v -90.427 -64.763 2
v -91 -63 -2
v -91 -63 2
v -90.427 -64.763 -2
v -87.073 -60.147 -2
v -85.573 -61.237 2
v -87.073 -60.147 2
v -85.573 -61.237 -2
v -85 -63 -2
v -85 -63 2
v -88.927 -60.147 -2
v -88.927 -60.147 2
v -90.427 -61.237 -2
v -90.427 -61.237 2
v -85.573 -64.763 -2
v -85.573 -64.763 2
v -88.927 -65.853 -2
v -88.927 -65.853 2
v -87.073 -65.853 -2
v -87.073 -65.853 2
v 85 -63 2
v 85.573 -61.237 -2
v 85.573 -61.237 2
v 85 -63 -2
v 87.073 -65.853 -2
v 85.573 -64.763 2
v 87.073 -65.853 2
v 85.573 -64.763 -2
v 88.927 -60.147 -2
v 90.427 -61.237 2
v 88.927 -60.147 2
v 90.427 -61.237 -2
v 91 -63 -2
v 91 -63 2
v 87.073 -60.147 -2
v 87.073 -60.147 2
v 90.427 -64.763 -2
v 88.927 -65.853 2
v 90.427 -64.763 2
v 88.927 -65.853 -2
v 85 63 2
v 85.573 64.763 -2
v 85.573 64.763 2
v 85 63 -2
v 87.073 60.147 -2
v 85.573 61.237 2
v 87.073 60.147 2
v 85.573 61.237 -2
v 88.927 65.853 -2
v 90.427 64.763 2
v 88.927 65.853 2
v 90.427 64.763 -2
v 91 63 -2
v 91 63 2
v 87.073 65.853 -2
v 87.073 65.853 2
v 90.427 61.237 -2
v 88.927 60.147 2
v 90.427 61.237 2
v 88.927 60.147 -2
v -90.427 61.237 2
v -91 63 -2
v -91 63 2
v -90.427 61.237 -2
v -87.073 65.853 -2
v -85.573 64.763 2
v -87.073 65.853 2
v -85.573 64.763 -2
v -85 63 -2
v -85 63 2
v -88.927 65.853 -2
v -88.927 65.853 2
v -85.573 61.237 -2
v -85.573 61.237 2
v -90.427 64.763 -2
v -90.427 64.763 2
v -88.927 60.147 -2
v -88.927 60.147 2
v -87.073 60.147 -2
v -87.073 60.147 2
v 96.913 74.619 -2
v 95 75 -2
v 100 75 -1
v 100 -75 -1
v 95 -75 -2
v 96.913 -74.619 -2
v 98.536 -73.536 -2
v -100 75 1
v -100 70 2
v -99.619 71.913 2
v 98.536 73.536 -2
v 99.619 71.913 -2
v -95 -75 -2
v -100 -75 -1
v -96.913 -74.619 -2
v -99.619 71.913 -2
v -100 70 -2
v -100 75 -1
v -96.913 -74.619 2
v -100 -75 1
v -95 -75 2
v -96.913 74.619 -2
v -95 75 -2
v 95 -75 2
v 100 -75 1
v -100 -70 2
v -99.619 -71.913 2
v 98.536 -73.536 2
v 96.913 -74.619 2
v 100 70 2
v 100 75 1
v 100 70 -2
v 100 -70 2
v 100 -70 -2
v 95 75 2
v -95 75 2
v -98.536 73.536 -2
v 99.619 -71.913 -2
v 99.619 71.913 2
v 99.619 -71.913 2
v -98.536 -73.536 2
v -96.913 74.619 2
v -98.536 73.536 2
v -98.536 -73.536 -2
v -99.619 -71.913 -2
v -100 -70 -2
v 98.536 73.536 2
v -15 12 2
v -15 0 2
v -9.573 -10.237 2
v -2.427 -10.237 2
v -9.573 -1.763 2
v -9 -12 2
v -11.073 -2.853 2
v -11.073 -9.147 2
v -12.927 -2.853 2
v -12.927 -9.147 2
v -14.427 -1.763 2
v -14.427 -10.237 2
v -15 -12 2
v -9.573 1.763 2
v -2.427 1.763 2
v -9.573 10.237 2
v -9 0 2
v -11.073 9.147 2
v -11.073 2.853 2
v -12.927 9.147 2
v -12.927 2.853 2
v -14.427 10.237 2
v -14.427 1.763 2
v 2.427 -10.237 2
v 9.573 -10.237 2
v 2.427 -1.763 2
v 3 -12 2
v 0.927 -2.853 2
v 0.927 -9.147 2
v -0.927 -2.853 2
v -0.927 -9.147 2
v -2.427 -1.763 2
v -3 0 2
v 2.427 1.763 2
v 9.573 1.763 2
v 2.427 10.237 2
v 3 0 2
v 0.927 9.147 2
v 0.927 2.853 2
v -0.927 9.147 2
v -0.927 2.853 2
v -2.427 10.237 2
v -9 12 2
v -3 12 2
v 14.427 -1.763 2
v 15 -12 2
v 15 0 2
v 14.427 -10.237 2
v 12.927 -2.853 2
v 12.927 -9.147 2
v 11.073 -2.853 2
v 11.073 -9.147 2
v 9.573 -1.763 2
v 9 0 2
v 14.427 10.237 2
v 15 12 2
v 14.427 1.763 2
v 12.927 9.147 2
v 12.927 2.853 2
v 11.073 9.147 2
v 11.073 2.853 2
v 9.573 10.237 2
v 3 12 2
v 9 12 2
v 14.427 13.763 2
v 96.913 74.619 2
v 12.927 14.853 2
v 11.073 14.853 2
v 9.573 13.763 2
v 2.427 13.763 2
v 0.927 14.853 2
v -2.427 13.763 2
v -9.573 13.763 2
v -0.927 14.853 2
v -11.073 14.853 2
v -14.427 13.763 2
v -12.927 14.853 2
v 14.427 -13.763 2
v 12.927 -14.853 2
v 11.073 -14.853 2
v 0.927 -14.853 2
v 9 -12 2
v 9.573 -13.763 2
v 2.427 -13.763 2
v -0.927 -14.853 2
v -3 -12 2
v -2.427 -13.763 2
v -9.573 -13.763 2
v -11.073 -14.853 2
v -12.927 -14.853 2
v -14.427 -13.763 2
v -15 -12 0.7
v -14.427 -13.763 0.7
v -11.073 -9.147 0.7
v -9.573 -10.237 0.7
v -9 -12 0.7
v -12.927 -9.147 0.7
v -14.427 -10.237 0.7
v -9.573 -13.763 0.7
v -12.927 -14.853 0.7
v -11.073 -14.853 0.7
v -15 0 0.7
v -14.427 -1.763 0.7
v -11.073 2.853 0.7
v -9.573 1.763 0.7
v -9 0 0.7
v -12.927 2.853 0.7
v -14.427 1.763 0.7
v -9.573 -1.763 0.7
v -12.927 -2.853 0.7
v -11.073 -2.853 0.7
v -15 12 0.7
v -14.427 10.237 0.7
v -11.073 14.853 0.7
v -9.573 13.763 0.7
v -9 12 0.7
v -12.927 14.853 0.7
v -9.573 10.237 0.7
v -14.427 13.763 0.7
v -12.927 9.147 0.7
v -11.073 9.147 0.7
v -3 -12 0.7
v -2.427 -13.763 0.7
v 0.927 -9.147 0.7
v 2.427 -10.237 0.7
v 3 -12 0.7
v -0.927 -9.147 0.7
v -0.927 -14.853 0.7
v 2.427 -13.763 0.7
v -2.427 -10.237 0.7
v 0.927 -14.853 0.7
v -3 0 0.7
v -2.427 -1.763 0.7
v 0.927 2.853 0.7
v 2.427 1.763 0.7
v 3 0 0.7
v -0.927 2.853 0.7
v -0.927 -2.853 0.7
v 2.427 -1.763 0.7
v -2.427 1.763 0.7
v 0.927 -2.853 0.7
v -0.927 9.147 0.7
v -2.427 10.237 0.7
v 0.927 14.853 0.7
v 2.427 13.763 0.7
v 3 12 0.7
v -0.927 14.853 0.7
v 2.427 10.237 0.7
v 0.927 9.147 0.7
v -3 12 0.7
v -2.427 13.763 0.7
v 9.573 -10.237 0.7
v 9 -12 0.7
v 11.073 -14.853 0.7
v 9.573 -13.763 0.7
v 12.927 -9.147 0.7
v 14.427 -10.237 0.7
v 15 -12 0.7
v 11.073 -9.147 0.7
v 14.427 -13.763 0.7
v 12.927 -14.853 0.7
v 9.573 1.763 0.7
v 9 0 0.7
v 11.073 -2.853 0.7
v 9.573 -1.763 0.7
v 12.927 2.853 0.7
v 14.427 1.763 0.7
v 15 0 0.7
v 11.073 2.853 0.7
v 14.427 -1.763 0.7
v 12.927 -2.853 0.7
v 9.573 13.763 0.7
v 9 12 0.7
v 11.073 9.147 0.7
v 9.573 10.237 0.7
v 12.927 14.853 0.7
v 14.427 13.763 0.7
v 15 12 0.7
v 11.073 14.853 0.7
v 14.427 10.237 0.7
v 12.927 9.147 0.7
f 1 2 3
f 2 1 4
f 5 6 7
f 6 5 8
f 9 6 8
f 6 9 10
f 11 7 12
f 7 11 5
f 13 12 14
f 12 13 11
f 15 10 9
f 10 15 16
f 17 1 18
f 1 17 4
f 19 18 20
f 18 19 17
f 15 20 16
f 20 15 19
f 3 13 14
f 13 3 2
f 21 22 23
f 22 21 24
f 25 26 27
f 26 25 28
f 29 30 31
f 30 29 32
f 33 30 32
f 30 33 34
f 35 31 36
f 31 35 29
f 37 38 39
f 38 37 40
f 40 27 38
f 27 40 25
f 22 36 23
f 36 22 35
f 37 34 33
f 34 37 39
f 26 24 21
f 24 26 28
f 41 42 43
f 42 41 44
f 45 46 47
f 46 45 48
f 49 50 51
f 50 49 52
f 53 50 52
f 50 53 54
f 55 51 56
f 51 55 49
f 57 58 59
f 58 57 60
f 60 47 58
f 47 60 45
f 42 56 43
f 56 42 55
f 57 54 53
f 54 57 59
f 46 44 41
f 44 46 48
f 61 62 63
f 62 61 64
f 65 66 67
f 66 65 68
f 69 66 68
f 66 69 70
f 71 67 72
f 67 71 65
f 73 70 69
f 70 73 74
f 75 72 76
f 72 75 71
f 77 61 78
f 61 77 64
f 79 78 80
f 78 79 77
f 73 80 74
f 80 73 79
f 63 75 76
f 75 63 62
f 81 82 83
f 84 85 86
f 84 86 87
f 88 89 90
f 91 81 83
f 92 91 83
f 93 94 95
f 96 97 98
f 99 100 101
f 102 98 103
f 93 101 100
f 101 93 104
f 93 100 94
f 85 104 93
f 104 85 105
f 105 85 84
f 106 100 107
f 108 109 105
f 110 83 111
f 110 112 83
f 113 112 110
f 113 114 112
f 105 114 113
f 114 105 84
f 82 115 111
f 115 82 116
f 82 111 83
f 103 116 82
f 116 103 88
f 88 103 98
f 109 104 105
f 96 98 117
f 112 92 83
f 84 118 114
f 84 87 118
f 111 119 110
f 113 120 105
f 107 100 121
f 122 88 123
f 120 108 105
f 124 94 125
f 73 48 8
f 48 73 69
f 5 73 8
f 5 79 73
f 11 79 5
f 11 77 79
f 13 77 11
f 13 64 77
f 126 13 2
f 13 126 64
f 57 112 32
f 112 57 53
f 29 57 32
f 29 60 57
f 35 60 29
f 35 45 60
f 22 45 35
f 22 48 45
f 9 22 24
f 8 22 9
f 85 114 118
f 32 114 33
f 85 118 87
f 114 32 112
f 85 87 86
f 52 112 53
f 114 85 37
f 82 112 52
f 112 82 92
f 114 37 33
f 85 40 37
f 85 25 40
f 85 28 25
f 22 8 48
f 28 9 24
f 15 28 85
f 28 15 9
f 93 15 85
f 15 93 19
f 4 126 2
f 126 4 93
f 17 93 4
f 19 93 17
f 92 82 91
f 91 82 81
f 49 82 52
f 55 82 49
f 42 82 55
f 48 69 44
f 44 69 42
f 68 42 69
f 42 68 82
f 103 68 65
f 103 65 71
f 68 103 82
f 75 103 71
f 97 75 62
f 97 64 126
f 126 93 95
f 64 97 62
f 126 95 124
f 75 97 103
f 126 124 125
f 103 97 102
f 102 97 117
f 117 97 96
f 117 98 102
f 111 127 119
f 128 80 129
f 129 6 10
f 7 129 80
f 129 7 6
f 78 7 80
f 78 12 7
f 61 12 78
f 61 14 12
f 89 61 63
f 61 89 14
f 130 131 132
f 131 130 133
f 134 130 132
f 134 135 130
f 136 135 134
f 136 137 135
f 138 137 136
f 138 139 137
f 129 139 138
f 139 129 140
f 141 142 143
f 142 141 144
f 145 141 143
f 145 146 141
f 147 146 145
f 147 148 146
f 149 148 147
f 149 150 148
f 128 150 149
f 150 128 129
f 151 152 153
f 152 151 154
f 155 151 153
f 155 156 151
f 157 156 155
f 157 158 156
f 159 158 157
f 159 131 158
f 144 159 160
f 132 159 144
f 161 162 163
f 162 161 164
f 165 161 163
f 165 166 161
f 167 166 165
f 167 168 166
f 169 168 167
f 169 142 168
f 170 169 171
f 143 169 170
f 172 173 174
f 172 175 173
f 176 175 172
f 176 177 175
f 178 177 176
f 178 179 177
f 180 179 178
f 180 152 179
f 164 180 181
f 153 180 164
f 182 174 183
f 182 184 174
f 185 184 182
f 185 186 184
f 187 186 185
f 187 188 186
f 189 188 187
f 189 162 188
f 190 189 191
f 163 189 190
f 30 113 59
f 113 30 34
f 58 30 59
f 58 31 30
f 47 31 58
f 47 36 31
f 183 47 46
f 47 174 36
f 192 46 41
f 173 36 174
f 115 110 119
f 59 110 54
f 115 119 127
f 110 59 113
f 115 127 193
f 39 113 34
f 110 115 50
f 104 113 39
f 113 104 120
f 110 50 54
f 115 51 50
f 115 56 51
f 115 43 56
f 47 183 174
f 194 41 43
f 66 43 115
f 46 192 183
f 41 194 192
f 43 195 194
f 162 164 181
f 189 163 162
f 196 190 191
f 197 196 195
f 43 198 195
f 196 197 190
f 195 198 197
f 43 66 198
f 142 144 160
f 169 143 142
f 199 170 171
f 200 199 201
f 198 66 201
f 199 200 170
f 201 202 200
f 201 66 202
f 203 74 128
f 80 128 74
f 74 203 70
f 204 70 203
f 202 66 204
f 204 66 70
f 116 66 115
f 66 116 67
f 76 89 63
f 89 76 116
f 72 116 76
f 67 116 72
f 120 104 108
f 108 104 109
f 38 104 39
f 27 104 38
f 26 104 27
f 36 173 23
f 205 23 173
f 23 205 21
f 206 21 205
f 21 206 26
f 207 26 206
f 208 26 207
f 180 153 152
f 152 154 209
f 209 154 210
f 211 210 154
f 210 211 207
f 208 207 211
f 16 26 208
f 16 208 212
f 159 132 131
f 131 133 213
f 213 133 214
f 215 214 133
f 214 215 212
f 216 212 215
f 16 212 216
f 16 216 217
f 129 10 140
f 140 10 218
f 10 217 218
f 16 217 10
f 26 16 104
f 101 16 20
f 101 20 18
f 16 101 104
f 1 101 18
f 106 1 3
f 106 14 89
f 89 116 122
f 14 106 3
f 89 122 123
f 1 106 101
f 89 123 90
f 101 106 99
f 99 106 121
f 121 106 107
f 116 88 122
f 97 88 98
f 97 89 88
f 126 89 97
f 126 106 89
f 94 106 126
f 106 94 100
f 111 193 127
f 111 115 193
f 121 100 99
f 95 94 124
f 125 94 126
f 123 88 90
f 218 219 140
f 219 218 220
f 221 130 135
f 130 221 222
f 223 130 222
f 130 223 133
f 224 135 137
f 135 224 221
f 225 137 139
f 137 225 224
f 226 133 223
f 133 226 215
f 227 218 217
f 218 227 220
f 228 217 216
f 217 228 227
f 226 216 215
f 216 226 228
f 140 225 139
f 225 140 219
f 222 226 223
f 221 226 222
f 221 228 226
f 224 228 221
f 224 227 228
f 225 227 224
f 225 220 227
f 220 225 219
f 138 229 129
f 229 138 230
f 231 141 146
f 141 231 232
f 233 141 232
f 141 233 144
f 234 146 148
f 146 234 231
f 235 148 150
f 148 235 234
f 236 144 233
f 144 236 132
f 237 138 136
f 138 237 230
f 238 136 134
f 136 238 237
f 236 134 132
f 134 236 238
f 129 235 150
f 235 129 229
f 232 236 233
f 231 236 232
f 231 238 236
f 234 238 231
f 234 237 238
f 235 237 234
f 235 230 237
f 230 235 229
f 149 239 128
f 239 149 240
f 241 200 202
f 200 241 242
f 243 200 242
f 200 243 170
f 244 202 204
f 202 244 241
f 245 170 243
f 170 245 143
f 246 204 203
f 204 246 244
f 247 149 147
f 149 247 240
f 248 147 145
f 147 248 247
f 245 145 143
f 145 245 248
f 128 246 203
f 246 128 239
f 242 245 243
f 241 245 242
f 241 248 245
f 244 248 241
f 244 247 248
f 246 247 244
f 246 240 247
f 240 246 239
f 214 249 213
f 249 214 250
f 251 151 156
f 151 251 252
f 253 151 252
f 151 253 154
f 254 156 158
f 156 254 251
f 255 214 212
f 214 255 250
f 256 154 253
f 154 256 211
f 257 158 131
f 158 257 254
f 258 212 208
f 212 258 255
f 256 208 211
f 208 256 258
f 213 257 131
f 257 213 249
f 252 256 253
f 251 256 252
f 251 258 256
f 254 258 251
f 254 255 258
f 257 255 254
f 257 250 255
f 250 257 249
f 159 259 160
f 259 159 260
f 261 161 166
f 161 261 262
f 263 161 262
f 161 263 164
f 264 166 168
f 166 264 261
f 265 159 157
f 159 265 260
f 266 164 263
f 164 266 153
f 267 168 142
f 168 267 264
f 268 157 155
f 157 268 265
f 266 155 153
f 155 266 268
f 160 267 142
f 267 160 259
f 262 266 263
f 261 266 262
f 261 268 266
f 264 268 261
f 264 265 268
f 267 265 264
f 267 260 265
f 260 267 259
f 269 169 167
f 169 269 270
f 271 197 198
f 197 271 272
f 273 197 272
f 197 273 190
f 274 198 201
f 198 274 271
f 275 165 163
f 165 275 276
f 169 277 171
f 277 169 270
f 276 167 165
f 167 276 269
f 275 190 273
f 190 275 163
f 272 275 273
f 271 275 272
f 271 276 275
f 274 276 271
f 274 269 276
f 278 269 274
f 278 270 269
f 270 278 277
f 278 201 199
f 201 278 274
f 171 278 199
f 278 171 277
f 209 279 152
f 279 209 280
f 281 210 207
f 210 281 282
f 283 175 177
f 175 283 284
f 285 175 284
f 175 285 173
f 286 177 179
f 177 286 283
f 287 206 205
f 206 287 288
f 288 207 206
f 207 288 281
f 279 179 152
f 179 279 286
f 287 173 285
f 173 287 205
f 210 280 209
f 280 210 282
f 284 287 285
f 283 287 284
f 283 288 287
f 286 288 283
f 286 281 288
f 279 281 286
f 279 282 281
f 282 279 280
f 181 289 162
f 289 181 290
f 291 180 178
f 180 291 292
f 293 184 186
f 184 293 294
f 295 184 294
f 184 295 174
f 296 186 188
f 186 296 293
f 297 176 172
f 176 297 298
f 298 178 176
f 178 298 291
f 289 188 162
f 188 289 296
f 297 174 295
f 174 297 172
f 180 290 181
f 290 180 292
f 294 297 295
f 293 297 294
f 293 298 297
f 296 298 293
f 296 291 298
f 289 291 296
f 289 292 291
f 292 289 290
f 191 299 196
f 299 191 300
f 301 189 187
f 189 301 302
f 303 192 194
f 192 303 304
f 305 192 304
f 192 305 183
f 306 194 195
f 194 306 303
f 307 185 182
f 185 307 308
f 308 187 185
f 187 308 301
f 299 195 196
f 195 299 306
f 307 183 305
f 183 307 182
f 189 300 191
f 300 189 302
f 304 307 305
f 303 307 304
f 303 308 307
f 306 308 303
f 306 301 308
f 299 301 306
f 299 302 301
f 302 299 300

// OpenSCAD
// Parameters
sheet_length = 200; //[100:400:1]
sheet_width = 150; //[75:300:1]
sheet_thickness = 2; //[1:6:0.5]
corner_radius = 5; //[2:15:0.5]
mount_hole_radius = 3; //[1.5:8:0.5]
mount_hole_edge_offset = 12; //[6:30:1]
texture_depth = 0.3; //[0.1:1:0.1]
texture_pitch = 12; //[6:30:1]
texture_bump_radius = 3; //[1:8:0.5]
texture_margin = 10; //[5:25:1]
overlap = 1; //[0.5:2:0.5]

// Base shapes
module silicone_sheet_body() {
  cube([sheet_length, sheet_width, sheet_thickness], center=true);
}

module rounded_corner(position) {
  intersection() {
    translate(position)
      cylinder(r=corner_radius, h=sheet_thickness + 2*overlap, center=true);
    translate(position)
      cube([corner_radius*2, corner_radius*2, sheet_thickness + 4*overlap], center=true);
  }
}

module mounting_hole(position) {
  translate(position)
    cylinder(r=mount_hole_radius, h=sheet_thickness + 4*overlap, center=true);
}

module texture_bump(position) {
  translate(position)
    cylinder(r=texture_bump_radius, h=texture_depth + 2*overlap, center=true);
}

module embossed_label() {
  translate([0, 0, sheet_thickness/2 - (sheet_thickness/10)/2 - overlap])
    cube([sheet_length/4, sheet_width/6, sheet_thickness/10], center=true);
}

// Operations
module rounded_corners_union() {
  union() {
    rounded_corner([sheet_length/2 - corner_radius, sheet_width/2 - corner_radius, 0]);
    rounded_corner([-(sheet_length/2 - corner_radius), sheet_width/2 - corner_radius, 0]);
    rounded_corner([-(sheet_length/2 - corner_radius), -(sheet_width/2 - corner_radius), 0]);
    rounded_corner([sheet_length/2 - corner_radius, -(sheet_width/2 - corner_radius), 0]);
  }
}

module sheet_with_rounded_corners() {
  hull() {
    rounded_corners_union();
    silicone_sheet_body();
  }
}

module surface_texture() {
  union() {
    for (x = [-texture_pitch, 0, texture_pitch])
      for (y = [-texture_pitch, 0, texture_pitch])
        texture_bump([x, y, sheet_thickness/2 - texture_depth/2 + overlap]);
  }
}

module mounting_holes() {
  union() {
    mounting_hole([-(sheet_length/2 - mount_hole_edge_offset), -(sheet_width/2 - mount_hole_edge_offset), 0]);
    mounting_hole([sheet_length/2 - mount_hole_edge_offset, -(sheet_width/2 - mount_hole_edge_offset), 0]);
    mounting_hole([sheet_length/2 - mount_hole_edge_offset, sheet_width/2 - mount_hole_edge_offset, 0]);
    mounting_hole([-(sheet_length/2 - mount_hole_edge_offset), sheet_width/2 - mount_hole_edge_offset, 0]);
  }
}

module sheet_minus_holes() {
  difference() {
    sheet_with_rounded_corners();
    mounting_holes();
  }
}

module sheet_minus_holes_minus_texture() {
  difference() {
    sheet_minus_holes();
    surface_texture();
  }
}

// Final model
module complete_model() {
  union() {
    sheet_minus_holes_minus_texture();
    embossed_label();
  }
}

// Render the complete model
color([0.85, 0.85, 0.8]) // Silicone color
complete_model();
